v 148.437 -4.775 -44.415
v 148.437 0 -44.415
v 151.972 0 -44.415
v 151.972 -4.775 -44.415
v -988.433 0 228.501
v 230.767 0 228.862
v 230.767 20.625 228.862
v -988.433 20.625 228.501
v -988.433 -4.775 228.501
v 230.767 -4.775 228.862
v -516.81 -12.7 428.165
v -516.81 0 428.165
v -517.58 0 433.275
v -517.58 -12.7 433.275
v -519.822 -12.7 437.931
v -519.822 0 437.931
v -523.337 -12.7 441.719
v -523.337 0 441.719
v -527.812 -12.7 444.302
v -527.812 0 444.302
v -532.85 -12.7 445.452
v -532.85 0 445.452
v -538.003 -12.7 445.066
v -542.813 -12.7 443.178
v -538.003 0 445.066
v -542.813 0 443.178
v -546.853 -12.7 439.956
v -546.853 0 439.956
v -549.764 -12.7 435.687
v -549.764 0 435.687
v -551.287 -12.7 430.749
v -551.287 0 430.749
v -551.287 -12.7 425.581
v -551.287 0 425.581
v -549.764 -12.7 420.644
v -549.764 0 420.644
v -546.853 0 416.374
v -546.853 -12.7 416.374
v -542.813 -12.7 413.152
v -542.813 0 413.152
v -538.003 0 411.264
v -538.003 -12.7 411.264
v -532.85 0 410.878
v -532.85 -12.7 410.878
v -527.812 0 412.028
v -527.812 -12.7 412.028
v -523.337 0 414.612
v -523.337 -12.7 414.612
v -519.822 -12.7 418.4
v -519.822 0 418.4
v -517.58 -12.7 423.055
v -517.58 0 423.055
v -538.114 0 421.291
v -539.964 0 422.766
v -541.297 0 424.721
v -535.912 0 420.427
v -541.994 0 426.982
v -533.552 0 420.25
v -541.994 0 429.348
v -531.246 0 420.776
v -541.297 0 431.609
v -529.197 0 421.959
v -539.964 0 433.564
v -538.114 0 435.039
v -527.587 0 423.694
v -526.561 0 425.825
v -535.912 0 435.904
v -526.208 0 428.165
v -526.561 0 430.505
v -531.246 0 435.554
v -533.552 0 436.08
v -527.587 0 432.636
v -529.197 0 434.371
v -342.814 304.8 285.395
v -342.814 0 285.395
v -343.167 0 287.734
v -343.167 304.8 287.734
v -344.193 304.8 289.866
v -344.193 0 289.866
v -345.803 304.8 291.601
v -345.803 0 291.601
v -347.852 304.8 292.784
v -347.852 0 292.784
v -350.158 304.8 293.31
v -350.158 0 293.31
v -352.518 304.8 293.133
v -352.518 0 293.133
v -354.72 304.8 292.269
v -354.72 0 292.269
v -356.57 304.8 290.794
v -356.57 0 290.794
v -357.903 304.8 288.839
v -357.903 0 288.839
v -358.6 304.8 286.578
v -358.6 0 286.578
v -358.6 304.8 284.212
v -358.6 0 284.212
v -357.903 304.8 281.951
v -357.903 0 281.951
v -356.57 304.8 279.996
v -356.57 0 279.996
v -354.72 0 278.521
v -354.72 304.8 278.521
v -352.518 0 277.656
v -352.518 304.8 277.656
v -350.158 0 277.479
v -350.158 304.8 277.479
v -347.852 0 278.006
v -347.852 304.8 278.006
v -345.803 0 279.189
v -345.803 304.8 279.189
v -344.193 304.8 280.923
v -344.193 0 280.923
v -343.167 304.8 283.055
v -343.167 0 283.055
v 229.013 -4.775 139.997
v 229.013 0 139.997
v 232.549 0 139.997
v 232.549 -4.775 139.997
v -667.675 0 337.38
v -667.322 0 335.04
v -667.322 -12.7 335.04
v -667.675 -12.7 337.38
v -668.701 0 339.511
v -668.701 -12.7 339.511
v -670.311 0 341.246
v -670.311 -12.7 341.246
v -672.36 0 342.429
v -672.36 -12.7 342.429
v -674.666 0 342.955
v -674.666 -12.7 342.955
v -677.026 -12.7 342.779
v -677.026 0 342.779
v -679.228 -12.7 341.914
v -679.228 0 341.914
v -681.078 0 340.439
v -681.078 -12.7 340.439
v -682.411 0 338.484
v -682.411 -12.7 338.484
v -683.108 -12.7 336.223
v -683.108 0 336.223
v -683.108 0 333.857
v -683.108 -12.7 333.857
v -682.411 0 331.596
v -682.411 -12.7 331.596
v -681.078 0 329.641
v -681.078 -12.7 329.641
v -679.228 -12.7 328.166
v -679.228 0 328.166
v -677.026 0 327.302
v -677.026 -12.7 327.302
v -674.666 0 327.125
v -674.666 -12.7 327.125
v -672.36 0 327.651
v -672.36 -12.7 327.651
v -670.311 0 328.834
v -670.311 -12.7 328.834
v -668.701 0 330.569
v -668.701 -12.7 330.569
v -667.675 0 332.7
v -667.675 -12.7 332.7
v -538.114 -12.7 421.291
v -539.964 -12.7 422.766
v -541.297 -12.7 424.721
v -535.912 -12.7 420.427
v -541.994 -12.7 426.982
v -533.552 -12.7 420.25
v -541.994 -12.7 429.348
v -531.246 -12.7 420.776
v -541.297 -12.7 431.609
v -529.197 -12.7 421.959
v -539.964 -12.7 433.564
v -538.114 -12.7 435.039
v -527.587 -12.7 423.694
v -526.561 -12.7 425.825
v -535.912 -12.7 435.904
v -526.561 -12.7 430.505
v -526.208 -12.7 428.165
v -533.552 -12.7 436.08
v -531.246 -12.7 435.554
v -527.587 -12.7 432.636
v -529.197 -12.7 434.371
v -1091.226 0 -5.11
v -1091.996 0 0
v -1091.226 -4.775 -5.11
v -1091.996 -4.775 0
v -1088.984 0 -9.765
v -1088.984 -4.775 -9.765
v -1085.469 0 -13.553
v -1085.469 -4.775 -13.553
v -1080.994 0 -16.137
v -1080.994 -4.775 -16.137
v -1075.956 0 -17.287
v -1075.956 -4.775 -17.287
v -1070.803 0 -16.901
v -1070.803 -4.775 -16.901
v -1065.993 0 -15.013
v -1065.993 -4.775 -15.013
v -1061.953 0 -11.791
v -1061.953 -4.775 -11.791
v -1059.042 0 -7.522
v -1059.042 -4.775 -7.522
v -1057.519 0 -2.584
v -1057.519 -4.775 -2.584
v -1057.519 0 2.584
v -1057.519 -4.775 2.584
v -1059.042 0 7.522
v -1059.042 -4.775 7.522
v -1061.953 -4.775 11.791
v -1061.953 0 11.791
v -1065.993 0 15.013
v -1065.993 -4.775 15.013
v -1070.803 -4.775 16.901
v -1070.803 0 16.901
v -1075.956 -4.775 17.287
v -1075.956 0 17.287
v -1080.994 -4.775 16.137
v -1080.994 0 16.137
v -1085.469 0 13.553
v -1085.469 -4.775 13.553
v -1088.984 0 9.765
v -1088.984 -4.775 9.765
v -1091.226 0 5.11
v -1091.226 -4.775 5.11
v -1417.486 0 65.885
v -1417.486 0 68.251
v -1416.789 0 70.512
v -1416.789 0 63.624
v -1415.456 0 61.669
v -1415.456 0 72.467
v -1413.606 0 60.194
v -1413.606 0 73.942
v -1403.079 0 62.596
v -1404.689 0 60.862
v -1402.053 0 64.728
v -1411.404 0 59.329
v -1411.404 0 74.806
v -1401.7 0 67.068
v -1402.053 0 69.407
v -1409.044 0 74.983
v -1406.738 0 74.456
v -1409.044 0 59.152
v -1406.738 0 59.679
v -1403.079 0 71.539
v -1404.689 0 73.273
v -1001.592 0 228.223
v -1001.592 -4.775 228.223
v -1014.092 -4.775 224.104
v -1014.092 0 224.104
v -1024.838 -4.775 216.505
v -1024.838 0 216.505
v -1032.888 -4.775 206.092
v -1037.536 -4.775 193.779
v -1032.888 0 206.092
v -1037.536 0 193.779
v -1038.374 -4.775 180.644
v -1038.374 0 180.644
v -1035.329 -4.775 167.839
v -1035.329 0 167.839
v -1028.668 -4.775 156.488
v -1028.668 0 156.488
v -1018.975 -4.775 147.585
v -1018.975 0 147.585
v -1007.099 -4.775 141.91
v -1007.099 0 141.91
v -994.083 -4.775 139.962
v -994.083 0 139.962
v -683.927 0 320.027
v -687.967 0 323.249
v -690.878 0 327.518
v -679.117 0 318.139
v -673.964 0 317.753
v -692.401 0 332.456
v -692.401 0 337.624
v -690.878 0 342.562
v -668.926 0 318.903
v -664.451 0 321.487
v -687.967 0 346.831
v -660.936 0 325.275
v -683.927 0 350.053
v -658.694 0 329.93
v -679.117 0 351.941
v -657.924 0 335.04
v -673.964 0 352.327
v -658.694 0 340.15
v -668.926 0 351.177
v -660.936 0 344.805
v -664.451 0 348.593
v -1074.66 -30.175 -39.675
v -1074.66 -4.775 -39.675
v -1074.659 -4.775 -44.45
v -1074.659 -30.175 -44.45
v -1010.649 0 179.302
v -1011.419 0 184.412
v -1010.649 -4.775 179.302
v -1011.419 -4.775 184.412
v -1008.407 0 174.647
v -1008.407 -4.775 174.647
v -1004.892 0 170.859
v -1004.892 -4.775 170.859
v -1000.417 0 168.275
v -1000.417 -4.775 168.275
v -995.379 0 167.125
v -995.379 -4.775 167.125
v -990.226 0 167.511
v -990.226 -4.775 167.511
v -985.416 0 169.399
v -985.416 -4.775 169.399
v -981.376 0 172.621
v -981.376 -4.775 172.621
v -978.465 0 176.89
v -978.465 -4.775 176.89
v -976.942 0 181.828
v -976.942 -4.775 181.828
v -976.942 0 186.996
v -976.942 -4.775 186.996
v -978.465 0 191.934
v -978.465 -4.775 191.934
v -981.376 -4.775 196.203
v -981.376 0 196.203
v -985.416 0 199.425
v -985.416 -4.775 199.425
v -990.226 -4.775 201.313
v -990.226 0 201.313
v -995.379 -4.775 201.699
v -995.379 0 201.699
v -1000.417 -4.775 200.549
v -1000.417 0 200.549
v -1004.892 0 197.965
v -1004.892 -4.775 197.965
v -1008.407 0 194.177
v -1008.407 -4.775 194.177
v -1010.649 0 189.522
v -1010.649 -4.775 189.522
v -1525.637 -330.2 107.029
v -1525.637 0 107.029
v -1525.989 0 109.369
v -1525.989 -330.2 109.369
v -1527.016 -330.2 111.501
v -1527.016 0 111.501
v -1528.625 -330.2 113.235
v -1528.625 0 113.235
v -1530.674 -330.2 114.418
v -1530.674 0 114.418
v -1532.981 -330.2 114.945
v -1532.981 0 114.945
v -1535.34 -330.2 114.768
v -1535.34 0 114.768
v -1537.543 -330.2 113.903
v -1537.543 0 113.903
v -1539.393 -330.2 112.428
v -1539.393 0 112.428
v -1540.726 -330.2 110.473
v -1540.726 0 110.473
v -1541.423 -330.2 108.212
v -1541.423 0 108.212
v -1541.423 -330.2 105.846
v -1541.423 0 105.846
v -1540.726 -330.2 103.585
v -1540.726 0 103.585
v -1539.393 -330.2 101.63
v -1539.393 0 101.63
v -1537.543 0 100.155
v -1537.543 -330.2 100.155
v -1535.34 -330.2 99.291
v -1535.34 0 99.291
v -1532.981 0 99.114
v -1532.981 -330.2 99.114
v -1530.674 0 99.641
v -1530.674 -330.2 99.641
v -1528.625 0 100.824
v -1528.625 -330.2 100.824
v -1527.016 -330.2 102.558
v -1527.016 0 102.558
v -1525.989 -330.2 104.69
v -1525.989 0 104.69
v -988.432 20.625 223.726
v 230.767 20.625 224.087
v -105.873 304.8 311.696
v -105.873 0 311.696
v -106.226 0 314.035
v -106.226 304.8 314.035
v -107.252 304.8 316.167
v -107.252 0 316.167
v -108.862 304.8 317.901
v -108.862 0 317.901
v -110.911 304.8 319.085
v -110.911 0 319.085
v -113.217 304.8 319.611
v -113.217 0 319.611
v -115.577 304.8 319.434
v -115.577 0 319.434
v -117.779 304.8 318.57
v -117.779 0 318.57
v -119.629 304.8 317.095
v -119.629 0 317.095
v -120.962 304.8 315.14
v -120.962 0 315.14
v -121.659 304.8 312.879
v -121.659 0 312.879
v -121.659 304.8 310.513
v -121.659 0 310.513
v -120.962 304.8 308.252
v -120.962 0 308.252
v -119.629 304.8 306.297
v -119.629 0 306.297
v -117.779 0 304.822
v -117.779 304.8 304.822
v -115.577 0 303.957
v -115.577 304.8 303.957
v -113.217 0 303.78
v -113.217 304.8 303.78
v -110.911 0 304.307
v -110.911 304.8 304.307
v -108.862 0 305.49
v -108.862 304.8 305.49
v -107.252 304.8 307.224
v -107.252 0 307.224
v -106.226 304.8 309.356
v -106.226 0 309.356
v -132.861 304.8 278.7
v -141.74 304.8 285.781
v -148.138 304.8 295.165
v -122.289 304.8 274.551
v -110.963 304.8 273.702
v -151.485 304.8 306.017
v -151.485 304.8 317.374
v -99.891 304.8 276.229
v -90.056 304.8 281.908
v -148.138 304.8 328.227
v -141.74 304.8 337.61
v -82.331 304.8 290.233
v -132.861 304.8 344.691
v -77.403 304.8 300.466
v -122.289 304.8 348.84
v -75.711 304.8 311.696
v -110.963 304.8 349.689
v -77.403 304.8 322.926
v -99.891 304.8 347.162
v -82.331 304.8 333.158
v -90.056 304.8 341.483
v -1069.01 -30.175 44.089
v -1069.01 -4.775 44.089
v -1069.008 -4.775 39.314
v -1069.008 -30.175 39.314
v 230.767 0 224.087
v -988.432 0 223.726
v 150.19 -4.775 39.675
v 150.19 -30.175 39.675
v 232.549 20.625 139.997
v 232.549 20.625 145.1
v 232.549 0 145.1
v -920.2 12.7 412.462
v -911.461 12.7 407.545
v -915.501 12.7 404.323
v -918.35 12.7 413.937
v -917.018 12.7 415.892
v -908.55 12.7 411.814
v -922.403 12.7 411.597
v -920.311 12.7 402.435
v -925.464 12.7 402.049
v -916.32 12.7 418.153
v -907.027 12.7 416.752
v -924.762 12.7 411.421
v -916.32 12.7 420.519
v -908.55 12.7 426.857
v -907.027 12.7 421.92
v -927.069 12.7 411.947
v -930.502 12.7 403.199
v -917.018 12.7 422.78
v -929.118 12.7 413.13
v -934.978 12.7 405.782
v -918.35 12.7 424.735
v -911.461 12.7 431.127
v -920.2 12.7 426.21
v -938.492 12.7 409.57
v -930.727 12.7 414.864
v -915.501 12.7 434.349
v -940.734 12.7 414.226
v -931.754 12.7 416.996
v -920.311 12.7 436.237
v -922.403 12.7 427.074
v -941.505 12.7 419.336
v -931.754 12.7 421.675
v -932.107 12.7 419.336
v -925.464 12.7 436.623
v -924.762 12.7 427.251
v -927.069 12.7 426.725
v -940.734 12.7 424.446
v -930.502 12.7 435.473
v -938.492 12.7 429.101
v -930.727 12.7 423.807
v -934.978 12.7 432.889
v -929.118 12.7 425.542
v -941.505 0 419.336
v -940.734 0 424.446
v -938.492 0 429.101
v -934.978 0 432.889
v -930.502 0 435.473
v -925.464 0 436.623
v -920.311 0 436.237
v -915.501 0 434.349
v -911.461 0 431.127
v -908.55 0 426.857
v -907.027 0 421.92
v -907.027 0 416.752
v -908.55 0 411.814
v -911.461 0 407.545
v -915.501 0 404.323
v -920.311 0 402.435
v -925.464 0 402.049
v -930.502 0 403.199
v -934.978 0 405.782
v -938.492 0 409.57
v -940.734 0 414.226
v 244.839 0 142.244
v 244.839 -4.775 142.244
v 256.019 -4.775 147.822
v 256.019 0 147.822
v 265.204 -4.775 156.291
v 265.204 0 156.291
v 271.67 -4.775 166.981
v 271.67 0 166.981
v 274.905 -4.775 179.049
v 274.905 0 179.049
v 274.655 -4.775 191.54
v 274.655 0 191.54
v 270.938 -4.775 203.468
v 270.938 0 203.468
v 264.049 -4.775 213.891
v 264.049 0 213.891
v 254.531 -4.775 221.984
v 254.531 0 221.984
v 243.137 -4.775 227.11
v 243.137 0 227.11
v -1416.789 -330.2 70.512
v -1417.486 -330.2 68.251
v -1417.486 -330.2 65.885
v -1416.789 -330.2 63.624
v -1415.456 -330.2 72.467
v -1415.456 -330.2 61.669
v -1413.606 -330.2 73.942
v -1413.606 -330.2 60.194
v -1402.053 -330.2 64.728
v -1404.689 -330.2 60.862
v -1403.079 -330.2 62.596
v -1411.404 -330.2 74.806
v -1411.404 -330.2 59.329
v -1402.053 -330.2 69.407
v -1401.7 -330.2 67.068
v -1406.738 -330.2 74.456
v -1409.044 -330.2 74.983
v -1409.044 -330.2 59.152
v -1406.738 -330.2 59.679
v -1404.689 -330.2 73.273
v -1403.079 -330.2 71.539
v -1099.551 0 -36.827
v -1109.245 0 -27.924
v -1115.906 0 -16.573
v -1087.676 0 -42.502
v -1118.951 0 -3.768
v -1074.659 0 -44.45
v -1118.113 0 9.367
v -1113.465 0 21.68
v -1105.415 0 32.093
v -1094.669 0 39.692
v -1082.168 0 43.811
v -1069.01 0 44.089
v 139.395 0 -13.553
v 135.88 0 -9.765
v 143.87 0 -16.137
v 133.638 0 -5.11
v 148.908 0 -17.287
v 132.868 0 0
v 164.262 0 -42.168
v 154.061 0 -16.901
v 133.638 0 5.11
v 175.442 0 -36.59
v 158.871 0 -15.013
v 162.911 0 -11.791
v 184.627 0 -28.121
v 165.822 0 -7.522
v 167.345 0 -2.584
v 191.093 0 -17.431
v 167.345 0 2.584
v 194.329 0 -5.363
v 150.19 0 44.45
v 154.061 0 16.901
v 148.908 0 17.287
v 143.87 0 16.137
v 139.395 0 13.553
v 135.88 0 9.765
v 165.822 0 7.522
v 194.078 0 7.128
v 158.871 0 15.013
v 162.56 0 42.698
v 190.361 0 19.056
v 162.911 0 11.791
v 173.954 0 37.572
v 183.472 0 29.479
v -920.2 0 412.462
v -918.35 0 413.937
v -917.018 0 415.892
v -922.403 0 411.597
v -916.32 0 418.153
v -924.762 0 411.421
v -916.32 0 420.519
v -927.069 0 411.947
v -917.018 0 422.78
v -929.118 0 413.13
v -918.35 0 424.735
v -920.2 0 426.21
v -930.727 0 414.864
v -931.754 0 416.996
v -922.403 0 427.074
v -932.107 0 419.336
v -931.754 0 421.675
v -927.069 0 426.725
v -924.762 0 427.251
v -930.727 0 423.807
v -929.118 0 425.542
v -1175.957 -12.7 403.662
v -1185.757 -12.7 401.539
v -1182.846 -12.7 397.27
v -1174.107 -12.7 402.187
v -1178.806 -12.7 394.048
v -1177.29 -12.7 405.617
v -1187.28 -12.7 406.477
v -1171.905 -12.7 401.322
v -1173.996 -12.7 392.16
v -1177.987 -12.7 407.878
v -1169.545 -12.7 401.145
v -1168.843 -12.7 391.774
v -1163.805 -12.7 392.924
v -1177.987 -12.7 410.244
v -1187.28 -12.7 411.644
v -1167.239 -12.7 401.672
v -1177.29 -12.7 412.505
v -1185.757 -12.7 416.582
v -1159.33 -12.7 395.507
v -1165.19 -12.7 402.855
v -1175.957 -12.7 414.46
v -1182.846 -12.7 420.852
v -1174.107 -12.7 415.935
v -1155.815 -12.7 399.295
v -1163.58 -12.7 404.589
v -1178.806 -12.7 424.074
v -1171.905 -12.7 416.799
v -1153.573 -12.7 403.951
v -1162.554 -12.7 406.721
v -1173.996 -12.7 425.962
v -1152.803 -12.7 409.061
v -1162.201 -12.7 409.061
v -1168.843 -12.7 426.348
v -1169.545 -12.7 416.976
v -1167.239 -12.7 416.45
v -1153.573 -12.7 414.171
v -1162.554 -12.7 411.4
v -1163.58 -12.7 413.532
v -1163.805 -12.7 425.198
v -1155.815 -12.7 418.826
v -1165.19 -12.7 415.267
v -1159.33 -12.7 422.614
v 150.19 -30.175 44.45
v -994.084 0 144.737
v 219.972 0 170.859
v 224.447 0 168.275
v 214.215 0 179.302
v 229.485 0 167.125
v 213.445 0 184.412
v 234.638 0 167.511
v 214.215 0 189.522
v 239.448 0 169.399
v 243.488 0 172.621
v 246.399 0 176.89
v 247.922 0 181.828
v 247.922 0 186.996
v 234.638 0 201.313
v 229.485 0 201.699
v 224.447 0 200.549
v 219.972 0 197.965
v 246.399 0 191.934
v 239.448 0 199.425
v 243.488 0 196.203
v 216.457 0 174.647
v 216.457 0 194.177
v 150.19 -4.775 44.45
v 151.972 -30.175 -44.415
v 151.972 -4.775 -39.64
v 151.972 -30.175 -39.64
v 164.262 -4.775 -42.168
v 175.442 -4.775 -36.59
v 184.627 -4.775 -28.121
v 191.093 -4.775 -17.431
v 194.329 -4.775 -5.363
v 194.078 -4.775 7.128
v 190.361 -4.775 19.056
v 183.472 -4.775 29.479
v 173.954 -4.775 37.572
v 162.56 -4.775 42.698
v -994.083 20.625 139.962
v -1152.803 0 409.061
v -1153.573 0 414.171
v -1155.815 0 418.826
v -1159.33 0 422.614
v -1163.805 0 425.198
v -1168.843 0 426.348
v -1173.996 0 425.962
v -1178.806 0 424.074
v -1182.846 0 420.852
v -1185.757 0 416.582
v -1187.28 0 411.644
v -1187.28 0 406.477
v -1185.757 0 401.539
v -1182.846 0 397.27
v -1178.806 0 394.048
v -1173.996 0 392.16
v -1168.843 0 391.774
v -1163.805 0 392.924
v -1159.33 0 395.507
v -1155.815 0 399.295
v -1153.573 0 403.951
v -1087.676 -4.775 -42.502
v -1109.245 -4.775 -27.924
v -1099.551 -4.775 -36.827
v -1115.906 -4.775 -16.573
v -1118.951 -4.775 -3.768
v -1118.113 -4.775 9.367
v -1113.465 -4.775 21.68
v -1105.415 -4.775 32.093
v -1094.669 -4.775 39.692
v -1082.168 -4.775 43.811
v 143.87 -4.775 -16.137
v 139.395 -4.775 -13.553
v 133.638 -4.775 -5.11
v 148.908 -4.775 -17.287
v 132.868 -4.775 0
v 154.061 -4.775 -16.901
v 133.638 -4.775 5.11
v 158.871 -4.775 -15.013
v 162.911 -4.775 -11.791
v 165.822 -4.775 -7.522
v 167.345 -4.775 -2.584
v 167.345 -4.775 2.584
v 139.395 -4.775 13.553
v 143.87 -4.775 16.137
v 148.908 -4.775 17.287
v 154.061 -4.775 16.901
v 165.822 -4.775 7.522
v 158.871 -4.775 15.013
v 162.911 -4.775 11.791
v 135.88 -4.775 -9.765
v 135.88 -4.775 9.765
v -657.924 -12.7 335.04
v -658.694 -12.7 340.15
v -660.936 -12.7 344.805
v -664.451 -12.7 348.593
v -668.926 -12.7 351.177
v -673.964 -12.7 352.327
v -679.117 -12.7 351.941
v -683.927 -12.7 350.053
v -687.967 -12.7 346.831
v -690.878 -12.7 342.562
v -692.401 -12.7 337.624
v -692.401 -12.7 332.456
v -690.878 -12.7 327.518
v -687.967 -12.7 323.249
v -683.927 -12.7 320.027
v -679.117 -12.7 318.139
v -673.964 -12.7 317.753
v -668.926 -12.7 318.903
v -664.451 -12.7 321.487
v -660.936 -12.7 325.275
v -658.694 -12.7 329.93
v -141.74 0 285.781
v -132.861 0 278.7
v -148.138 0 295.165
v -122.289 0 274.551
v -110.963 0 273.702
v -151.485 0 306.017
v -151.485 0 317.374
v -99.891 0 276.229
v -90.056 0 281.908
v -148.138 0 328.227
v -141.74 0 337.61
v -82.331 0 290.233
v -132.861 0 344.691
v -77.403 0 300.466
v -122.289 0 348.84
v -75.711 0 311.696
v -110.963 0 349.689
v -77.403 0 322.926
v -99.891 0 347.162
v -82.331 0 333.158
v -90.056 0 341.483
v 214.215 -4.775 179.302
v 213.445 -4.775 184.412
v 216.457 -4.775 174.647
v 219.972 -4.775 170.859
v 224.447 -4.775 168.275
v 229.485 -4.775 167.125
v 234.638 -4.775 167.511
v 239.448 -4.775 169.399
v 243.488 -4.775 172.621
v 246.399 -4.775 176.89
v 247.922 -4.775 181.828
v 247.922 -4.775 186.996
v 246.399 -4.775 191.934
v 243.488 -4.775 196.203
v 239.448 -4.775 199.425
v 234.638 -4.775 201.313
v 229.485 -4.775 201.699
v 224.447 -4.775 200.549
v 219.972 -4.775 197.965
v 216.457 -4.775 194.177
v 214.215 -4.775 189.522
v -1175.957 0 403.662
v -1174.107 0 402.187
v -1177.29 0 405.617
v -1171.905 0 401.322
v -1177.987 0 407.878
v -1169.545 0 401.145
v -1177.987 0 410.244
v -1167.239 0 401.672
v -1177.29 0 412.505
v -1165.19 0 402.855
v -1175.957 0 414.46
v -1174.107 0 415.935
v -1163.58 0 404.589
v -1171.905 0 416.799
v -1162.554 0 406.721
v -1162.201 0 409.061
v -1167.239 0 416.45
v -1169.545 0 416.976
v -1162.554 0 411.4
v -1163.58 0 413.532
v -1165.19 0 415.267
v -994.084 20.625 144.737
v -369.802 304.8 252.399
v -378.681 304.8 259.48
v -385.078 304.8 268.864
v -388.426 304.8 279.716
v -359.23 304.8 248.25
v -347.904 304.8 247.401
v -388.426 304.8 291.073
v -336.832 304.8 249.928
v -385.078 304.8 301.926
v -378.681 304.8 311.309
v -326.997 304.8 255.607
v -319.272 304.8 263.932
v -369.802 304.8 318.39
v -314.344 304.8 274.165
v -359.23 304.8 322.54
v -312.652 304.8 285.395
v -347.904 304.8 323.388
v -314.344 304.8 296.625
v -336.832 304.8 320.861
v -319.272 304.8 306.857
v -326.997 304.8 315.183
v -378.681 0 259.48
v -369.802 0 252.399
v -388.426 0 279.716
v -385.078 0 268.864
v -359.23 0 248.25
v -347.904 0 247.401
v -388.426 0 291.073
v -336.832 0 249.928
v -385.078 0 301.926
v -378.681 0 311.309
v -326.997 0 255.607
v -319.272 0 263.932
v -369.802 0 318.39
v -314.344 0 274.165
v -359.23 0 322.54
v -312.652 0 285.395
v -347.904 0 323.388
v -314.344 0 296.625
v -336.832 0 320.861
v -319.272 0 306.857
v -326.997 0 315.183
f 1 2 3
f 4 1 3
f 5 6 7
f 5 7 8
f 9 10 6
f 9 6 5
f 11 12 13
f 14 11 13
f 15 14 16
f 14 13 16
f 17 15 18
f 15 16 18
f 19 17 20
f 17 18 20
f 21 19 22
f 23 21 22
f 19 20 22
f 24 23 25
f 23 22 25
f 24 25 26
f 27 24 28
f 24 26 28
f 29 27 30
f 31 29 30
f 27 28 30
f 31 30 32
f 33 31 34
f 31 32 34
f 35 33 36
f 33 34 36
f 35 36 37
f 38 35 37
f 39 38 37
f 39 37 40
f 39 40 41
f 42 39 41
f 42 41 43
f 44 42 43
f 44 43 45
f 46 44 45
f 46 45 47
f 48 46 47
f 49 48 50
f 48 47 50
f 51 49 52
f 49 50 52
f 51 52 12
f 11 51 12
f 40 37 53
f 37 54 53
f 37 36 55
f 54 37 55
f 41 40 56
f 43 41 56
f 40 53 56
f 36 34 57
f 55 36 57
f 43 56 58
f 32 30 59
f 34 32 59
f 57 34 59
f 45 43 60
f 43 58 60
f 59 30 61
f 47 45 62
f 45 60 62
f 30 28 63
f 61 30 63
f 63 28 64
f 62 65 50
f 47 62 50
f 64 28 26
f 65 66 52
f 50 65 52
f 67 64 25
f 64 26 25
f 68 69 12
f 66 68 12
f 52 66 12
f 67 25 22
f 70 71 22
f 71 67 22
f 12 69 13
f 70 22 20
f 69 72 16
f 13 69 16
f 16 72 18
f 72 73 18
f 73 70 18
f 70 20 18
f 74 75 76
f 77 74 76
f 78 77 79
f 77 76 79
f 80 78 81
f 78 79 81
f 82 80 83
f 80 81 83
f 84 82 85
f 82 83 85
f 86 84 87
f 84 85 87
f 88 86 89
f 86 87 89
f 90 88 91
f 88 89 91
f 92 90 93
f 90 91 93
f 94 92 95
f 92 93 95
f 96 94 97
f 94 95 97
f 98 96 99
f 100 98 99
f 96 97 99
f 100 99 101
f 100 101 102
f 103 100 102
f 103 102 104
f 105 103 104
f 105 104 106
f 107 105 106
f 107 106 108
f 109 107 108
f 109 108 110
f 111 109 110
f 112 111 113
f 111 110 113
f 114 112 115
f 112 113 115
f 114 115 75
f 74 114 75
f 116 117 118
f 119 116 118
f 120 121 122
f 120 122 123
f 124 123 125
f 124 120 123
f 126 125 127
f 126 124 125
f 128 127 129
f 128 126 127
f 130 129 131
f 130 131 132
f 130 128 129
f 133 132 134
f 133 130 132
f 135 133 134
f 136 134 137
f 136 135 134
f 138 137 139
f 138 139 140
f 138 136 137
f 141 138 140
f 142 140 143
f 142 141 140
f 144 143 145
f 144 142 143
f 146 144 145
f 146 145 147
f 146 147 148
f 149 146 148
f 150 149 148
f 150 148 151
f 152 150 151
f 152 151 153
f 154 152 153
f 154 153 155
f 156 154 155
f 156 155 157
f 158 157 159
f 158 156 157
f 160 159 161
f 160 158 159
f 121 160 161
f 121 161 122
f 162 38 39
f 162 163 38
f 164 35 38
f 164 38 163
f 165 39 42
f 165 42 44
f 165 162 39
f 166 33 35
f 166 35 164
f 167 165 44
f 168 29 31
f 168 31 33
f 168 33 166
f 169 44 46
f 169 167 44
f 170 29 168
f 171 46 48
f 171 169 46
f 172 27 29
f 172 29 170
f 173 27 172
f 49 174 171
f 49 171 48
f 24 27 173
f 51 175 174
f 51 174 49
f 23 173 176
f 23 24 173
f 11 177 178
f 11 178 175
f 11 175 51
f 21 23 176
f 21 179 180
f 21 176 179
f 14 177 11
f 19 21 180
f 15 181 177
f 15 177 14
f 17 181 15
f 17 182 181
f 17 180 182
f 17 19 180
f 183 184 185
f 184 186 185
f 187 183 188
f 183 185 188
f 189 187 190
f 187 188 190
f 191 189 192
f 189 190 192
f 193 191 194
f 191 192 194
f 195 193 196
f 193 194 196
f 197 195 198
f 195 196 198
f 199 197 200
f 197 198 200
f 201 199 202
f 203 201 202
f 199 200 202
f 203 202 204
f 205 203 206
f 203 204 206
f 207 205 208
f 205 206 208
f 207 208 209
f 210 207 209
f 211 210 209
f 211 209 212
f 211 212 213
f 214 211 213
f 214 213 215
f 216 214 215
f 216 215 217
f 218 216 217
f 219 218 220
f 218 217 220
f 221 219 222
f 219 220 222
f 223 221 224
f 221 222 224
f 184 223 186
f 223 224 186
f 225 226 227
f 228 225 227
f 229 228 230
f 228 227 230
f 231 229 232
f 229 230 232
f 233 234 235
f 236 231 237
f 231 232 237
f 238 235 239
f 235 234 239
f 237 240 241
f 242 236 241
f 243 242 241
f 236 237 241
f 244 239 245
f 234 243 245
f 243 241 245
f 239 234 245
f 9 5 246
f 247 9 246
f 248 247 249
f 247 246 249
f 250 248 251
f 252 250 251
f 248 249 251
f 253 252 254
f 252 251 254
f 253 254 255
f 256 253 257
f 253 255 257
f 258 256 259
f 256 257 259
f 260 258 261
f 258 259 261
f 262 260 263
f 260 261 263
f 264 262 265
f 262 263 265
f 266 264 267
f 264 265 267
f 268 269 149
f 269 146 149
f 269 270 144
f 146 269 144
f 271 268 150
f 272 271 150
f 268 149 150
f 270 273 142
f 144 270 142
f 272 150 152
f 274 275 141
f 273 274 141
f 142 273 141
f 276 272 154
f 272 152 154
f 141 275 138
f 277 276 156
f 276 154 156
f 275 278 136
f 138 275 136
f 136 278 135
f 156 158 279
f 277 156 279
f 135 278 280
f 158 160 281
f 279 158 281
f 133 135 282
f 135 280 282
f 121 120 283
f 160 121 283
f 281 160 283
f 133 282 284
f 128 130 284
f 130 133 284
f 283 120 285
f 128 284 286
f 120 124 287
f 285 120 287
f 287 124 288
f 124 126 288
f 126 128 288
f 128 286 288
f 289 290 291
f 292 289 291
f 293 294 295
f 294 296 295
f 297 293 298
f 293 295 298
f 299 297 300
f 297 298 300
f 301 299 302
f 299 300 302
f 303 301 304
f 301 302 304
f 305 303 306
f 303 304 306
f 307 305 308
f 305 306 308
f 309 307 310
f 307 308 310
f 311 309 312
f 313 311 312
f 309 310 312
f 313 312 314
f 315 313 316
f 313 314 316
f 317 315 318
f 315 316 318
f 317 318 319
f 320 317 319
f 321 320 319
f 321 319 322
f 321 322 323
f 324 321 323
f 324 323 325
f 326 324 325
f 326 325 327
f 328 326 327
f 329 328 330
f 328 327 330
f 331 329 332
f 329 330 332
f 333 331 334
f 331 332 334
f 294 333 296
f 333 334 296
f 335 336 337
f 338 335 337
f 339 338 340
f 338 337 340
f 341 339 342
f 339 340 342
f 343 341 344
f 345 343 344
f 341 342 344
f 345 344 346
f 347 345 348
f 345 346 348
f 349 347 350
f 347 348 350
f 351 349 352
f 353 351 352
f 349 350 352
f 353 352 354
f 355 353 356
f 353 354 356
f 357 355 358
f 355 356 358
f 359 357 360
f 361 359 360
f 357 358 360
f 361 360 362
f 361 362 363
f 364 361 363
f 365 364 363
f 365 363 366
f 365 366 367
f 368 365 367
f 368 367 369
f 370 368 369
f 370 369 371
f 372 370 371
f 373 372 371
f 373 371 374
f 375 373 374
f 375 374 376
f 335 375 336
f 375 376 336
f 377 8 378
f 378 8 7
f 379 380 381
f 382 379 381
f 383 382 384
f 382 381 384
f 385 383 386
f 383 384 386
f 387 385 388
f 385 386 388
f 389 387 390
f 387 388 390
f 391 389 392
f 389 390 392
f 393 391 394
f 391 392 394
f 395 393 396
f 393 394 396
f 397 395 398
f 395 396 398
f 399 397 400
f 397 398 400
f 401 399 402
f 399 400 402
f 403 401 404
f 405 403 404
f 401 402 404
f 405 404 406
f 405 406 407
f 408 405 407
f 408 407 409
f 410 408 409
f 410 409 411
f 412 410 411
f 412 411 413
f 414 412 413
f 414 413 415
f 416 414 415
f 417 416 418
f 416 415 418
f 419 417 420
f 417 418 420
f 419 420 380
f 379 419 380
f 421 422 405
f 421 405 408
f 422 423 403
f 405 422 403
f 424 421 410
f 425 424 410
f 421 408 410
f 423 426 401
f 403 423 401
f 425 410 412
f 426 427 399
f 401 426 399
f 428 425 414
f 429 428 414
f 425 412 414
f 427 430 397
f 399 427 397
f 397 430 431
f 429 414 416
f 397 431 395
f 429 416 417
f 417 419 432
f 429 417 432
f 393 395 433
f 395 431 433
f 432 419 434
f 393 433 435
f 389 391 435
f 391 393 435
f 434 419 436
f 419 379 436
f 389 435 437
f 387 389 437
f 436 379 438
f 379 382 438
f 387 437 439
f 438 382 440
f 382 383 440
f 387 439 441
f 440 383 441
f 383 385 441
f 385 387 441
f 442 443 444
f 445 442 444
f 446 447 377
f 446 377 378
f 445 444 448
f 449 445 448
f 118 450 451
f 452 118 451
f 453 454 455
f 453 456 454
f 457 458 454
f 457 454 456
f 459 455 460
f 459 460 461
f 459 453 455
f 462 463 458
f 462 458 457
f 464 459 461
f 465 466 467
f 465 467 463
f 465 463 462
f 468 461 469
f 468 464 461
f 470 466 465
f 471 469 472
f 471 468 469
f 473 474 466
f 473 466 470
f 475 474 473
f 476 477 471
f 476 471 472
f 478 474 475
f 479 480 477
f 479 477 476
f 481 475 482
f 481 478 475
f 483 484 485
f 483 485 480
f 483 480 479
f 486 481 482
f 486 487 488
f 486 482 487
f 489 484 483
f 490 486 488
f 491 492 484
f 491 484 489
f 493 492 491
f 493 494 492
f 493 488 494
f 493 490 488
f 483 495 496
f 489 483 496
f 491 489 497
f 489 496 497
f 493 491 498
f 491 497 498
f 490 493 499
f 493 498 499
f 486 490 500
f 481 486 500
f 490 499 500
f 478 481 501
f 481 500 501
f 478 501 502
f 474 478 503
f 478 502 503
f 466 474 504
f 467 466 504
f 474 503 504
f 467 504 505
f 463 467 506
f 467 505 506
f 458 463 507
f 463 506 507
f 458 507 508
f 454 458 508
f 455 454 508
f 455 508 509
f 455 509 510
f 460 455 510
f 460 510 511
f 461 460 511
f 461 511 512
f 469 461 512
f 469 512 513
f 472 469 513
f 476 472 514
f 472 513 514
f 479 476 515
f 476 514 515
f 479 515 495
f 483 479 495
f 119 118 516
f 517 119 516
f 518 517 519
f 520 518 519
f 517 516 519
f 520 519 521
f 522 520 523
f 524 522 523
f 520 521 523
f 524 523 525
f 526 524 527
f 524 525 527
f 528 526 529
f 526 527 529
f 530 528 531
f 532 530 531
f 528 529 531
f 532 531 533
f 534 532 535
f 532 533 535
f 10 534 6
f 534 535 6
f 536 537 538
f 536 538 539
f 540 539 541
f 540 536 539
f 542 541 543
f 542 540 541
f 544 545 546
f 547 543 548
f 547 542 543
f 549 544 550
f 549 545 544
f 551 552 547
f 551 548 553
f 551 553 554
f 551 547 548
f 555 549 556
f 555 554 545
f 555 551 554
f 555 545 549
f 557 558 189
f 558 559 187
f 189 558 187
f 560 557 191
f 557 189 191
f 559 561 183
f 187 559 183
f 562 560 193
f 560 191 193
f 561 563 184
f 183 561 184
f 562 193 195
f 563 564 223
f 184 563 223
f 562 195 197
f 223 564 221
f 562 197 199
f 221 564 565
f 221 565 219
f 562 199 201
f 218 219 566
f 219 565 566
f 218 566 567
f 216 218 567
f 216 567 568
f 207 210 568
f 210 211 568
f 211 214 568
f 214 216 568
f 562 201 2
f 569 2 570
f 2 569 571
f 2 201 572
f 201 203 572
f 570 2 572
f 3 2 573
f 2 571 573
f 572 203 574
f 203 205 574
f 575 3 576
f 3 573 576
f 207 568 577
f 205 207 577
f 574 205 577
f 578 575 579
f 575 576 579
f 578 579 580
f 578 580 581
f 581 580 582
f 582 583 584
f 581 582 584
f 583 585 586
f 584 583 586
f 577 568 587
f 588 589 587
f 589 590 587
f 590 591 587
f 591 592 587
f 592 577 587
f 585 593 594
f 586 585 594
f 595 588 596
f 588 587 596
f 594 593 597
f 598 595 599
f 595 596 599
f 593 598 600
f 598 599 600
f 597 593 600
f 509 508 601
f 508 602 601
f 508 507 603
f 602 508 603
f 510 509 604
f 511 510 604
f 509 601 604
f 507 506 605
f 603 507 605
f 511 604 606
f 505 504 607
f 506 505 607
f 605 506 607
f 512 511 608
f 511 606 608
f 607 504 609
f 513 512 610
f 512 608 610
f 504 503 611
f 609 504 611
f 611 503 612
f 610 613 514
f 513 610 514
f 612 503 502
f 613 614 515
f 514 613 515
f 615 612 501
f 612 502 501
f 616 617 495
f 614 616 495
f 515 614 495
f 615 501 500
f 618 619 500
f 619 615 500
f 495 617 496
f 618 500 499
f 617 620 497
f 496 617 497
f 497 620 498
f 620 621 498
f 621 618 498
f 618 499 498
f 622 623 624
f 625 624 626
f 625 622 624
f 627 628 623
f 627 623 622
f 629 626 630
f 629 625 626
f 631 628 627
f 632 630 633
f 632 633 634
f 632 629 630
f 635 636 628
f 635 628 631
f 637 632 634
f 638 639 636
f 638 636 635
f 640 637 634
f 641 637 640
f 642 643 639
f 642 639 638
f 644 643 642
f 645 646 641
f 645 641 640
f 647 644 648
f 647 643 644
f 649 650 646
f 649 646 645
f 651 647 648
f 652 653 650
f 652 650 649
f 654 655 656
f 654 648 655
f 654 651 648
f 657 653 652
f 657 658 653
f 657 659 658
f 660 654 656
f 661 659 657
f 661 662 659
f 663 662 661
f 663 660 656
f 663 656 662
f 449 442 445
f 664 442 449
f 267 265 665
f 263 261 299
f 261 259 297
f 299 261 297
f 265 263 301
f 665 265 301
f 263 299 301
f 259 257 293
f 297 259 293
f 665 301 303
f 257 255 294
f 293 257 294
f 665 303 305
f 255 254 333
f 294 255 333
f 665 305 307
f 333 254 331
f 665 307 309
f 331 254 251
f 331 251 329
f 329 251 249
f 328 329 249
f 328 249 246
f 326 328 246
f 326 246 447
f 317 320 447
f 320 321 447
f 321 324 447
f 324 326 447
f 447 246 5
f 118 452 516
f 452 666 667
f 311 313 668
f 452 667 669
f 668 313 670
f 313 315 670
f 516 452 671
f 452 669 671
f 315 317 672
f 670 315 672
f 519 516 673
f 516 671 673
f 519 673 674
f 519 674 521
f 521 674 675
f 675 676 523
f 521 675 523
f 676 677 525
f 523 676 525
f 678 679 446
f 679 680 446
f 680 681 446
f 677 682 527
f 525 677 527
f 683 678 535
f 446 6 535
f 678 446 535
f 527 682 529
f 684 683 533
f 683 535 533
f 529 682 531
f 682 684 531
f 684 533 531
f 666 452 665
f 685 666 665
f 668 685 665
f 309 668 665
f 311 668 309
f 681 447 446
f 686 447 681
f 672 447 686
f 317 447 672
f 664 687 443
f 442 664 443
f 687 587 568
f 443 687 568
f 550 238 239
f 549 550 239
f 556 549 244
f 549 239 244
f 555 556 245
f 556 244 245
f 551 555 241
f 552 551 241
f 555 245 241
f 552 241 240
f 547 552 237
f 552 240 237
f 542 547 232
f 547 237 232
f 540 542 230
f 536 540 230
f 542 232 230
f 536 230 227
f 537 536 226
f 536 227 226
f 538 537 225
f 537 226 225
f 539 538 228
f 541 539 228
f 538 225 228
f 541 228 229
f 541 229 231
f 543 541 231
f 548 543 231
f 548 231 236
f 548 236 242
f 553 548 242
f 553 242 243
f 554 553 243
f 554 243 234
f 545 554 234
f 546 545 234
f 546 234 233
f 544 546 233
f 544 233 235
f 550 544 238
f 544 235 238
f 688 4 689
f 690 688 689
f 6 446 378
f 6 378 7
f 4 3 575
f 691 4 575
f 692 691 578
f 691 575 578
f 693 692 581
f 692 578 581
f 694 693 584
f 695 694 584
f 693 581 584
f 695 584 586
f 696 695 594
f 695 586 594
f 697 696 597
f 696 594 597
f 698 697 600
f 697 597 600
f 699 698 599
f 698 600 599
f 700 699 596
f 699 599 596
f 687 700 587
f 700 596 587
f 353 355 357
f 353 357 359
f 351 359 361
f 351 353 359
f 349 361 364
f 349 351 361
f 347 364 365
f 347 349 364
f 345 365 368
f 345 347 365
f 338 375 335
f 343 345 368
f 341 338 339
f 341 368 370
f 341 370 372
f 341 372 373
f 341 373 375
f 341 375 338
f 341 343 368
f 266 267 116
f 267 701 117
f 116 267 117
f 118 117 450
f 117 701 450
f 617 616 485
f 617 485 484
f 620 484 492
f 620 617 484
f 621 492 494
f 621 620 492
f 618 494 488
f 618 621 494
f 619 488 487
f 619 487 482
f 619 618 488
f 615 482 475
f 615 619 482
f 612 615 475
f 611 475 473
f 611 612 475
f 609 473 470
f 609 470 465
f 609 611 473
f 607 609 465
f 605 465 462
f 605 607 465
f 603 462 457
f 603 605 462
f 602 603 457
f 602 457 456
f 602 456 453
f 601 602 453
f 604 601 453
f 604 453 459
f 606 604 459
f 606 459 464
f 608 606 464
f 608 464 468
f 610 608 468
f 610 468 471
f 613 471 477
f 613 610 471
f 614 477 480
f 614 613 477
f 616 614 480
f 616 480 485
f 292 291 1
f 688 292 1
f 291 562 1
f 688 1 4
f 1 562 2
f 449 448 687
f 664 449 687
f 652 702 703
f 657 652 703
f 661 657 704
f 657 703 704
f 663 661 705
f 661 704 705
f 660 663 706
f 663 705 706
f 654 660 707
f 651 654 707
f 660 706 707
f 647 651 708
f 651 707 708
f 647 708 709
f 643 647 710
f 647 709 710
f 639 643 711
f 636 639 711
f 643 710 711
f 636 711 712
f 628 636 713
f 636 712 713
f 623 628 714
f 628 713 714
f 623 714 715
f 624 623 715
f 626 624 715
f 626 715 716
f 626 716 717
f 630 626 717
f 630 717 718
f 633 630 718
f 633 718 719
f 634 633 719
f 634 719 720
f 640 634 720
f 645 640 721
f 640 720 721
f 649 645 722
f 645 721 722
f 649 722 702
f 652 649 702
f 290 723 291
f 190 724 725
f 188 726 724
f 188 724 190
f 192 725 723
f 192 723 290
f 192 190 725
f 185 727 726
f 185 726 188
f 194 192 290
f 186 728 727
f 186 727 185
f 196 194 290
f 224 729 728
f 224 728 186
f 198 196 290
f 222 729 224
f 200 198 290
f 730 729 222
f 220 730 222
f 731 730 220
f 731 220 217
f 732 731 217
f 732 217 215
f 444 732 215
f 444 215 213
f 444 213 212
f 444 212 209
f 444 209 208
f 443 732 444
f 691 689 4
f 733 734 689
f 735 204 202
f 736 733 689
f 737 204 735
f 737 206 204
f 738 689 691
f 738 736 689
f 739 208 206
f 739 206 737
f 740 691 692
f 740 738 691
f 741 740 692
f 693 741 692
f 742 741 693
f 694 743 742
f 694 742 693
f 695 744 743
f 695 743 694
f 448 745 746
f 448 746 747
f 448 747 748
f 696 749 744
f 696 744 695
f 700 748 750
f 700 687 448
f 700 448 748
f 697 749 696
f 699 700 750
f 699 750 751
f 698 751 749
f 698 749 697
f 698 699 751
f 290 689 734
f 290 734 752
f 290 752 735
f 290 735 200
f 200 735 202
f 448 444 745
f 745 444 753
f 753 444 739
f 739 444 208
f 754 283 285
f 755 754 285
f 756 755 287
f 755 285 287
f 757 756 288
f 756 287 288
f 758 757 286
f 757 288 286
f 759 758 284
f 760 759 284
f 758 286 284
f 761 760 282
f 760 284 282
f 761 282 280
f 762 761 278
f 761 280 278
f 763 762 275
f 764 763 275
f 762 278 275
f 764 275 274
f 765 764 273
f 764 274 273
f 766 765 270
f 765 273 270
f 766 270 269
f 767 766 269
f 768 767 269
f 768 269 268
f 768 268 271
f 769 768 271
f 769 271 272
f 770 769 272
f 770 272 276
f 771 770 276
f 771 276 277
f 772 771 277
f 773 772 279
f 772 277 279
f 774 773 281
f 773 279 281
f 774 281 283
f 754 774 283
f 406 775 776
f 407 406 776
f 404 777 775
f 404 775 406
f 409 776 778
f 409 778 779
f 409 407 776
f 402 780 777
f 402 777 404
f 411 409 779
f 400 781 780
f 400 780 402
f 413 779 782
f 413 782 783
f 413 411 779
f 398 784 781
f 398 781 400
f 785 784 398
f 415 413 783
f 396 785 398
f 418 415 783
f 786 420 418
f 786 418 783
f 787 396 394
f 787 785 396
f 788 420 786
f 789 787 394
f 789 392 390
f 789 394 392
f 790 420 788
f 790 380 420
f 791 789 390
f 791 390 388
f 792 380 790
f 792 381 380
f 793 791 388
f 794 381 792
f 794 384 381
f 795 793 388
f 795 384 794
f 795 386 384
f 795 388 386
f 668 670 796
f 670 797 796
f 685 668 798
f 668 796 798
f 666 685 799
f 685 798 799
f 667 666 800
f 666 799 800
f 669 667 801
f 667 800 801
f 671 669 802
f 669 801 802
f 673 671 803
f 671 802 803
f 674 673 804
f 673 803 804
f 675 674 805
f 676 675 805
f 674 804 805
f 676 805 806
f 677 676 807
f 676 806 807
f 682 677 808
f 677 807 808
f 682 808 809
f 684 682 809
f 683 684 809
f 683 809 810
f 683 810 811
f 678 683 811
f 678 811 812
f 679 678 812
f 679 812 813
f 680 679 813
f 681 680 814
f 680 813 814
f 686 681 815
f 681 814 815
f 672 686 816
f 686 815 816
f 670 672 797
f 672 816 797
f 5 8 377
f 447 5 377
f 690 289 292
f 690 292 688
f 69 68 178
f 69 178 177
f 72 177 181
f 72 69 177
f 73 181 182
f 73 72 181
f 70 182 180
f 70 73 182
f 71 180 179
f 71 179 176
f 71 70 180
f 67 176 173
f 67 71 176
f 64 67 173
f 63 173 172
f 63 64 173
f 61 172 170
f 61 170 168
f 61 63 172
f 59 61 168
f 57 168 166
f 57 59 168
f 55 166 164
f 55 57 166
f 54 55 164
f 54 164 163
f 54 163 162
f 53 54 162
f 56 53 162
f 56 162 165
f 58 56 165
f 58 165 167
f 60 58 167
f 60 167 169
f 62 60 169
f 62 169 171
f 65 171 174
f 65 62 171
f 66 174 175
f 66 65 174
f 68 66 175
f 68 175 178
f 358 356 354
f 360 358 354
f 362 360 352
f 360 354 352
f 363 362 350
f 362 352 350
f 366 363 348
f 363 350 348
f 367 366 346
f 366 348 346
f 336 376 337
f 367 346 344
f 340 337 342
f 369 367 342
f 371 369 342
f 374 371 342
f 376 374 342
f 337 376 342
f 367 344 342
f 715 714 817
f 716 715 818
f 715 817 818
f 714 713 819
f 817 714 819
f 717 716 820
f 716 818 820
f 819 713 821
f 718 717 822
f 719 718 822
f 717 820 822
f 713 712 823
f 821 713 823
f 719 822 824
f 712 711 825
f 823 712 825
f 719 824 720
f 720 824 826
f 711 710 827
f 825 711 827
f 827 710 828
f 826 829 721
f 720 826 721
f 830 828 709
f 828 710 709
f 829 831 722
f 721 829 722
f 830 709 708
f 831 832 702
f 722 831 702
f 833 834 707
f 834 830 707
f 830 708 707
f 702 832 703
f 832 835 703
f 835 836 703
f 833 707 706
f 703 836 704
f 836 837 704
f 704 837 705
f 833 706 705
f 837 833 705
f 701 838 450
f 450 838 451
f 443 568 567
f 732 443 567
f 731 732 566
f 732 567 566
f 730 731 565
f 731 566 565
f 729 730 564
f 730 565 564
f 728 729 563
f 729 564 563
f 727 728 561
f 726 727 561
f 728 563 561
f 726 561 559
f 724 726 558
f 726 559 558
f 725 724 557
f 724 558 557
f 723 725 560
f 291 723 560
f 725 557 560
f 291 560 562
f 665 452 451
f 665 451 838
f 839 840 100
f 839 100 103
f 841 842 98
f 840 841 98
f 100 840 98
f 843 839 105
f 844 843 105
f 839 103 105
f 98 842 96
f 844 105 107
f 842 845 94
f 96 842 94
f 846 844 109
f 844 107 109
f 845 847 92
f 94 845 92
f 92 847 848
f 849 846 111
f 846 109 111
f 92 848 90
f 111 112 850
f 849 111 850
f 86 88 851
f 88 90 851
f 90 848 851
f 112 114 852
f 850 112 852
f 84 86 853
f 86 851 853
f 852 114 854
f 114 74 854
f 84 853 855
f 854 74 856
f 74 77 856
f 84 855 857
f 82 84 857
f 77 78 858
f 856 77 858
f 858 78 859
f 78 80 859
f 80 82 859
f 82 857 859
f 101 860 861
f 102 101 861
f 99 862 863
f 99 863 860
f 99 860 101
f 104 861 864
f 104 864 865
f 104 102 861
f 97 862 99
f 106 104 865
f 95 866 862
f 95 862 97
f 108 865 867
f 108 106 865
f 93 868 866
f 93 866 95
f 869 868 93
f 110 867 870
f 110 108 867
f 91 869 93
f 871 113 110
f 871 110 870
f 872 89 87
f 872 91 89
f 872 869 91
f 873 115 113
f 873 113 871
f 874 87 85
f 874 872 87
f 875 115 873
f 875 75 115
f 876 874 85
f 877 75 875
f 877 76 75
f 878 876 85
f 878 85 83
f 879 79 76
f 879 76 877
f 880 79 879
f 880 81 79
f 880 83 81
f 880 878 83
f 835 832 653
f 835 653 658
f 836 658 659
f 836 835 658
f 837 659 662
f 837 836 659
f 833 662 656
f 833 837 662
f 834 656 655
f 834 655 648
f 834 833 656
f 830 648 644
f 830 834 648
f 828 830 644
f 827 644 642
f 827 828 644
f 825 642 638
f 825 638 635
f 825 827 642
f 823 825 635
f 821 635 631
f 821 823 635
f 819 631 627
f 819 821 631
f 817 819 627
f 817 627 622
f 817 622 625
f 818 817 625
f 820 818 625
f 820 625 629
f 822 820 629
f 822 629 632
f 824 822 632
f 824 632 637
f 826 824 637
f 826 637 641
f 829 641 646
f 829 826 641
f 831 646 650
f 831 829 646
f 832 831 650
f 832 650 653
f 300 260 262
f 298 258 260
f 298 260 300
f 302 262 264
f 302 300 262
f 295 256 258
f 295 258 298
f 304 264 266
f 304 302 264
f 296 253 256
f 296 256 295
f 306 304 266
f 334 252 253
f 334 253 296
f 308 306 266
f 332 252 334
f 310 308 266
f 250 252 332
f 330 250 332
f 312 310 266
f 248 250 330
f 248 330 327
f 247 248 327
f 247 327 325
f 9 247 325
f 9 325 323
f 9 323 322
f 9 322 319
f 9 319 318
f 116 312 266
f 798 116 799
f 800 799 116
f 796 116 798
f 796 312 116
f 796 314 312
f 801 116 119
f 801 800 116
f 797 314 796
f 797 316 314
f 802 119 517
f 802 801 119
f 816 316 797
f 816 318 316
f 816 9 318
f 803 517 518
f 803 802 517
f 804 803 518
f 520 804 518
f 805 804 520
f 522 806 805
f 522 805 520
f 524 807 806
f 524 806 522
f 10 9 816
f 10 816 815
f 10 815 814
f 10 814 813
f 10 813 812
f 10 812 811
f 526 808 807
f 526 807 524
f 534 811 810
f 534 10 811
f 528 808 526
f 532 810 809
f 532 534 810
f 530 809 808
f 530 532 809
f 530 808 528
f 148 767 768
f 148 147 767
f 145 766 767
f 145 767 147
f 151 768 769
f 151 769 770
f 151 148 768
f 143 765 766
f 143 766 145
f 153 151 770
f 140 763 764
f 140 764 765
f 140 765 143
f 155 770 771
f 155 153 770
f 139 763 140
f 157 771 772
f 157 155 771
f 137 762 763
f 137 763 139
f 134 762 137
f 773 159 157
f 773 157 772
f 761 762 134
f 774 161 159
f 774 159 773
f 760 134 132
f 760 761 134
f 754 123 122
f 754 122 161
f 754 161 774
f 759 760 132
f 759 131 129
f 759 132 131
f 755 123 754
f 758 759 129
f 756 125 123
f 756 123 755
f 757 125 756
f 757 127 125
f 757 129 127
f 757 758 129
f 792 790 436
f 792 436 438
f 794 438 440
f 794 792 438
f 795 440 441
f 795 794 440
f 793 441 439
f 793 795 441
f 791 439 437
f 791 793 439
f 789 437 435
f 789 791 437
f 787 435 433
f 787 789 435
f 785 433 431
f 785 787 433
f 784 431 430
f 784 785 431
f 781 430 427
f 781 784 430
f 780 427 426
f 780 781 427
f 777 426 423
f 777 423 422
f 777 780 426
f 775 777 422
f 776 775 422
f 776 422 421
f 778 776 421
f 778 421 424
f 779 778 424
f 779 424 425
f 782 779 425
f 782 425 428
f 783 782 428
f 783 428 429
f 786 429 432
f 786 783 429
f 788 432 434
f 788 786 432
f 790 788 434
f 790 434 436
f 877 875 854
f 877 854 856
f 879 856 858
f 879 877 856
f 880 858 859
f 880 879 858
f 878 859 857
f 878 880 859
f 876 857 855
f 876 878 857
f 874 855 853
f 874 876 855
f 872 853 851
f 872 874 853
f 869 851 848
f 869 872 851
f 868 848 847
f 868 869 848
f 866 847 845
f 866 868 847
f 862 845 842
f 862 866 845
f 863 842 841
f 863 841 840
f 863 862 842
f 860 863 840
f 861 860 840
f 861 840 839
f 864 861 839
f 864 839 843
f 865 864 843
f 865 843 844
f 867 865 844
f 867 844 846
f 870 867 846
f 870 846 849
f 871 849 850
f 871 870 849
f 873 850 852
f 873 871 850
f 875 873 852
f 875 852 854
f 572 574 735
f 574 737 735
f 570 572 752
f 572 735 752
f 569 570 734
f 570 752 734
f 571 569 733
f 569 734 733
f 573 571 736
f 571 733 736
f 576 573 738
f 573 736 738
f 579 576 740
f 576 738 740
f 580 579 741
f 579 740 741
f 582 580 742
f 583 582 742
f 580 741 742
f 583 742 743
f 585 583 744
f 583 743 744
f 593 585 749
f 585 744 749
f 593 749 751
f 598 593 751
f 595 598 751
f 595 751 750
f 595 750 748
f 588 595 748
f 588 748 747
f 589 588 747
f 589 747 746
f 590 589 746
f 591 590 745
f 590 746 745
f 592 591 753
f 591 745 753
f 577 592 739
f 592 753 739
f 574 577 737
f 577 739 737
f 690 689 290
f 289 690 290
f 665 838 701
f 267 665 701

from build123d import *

# Parameters (mm, degrees)
F1_DEPTH  = 4.7752
F2_D      = 34.671
F2_DEPTH  = 4.7752
F2_TIP    = 10.4162192612
F4_DEPTH  = 25.4
F6_DEPTH  = 4.7752
F7_D      = 34.671
F7_DEPTH  = 4.7752
F7_TIP    = 10.4162192612
F9_DEPTH  = 25.4
F10_R     = 17.3355
F10_R_2   = 7.9375
F11_DEPTH = 12.7
F12_R     = 17.3355
F12_R_2   = 7.9375
F13_DEPTH = 12.7
F14_R     = 17.3355
F14_R_2   = 7.9375
F15_DEPTH = 12.7
F16_R     = 17.3355
F16_R_2   = 7.9375
F17_DEPTH = 12.7
F18_R     = 38.1
F18_R_2   = 7.9375
F19_DEPTH = 304.8
F20_R     = 38.1
F20_R_2   = 7.9375
F21_DEPTH = 304.8
F22_R     = 7.9375
F23_DEPTH = 330.2
F24_R     = 7.9375
F25_DEPTH = 330.2


# Not quite as in the source:
# - a feature names something its author has since deleted; it is built from what else it names


with BuildPart() as f1:
    # F0 (on Front) → F1 (new body)
    with BuildSketch(Plane.XZ):
        with BuildLine():
            Line((-1074.6594506346, -44.4499999817), (148.4365754055, -44.414878516))
            Line((148.4365754055, -44.414878516), (151.9724341991, -44.414776983))
            ThreePointArc((151.9724341991, -44.414776983), (194.6442914443, 0.8913507924), (150.1900805819, 44.4499980552))
            Line((150.1900805819, 44.4499980552), (-1069.0098660753, 44.0893441833))
            ThreePointArc((-1069.0098660753, 44.0893441833), (-1119.0205120843, 2.8305422757), (-1074.6594506346, -44.4499999817))
        make_face()
    extrude(amount=F1_DEPTH)

    # F2
    with Locations(Plane(origin=(0, 0, 0), x_dir=(1, 0, 0), z_dir=(0, 1, 0))):
        with Locations((-1074.6607270259, 0), (150.2032294209, 0)):
            Hole(F2_D / 2, depth=F2_DEPTH)
            with Locations((0, 0, -(F2_DEPTH + F2_TIP / 2))):  # 118° drill point
                Cone(0, F2_D / 2, F2_TIP, mode=Mode.SUBTRACT)

    # F3 (on face) → F4 (join)
    with BuildSketch(Plane.XZ.offset(4.7752)):
        Polygon((-1074.6595877555, -39.6747999836), (-1074.6594506346, -44.4499999817), (151.9724341991, -44.414776983), (151.9722970782, -39.639576985), align=None)
        Polygon((150.1900805819, 44.4499980552), (-1069.0098660753, 44.0893441833), (-1069.0084535143, 39.3141446012), (150.1900805819, 39.6747980552), align=None)
    extrude(amount=F4_DEPTH)


with BuildPart() as f6:
    # F5 (on Front) → F6 (new body)
    with BuildSketch(Plane.XZ):
        with BuildLine():
            Line((-994.0826163973, 139.9620227242), (229.0134096428, 139.9971441899))
            Line((229.0134096428, 139.9971441899), (232.5492684364, 139.9972457228))
            ThreePointArc((232.5492684364, 139.9972457228), (275.2211256816, 185.3033734983), (230.7669148192, 228.8620207611))
            Line((230.7669148192, 228.8620207611), (-988.433031838, 228.5013668892))
            ThreePointArc((-988.433031838, 228.5013668892), (-1038.443677847, 187.2425649815), (-994.0826163973, 139.9620227242))
        make_face()
    extrude(amount=F6_DEPTH)

    # F7
    with Locations(Plane(origin=(0, 0, 0), x_dir=(1, 0, 0), z_dir=(0, 1, 0))):
        with Locations((-994.0838927886, -184.4120227059), (230.7800636583, -184.4120227059)):
            Hole(F7_D / 2, depth=F7_DEPTH)
            with Locations((0, 0, -(F7_DEPTH + F7_TIP / 2))):  # 118° drill point
                Cone(0, F7_D / 2, F7_TIP, mode=Mode.SUBTRACT)

    # F8 (on face) → F9 (join)
    with BuildSketch(Plane.XZ.offset(4.7752)):
        Polygon((230.7669148192, 228.8620207611), (-988.433031838, 228.5013668892), (-988.431619277, 223.7261670981), (230.7669148192, 224.0868205521), align=None)
        Polygon((-994.0840289583, 144.7372225153), (-994.0826163973, 139.9620227242), (232.5492684364, 139.9972457228), (232.5492684364, 145.1000752608), align=None)
    extrude(amount=-F9_DEPTH)


with BuildPart() as f11:
    # F10 (on Front) → F11 (new body)
    with BuildSketch(Plane.XZ):
        with Locations((-675.2595901489, 335.0400328636)):
            Circle(F10_R)
        with Locations((-675.2595901489, 335.0400328636)):
            Circle(F10_R_2, mode=Mode.SUBTRACT)
    extrude(amount=F11_DEPTH)


with BuildPart() as f13:
    # F12 (on face) → F13 (new body)
    with BuildSketch(Plane(origin=(0, 0, 0), x_dir=(-1, 0, 0), z_dir=(0, 1, 0))):
        with Locations((924.1690039635, 419.3358123302)):
            Circle(F12_R)
        with Locations((924.1690039635, 419.3358123302)):
            Circle(F12_R_2, mode=Mode.SUBTRACT)
    extrude(amount=F13_DEPTH)


with BuildPart() as f15:
    # F14 (on Front) → F15 (new body)
    with BuildSketch(Plane.XZ):
        with Locations((-534.1455936432, 428.1651079655)):
            Circle(F14_R)
        with Locations((-534.1455936432, 428.1651079655)):
            Circle(F14_R_2, mode=Mode.SUBTRACT)
    extrude(amount=F15_DEPTH)


with BuildPart() as f17:
    # F16 (on Front) → F17 (new body)
    with BuildSketch(Plane.XZ):
        with Locations((-1170.1385974884, 409.0607762337)):
            Circle(F16_R)
        with Locations((-1170.1385974884, 409.0607762337)):
            Circle(F16_R_2, mode=Mode.SUBTRACT)
    extrude(amount=F17_DEPTH)


with BuildPart() as f19:
    # F18 (on Front) → F19 (new body)
    with BuildSketch(Plane.XZ):
        with Locations((-350.7515192032, 285.3947877884)):
            Circle(F18_R)
        with Locations((-350.7515192032, 285.3947877884)):
            Circle(F18_R_2, mode=Mode.SUBTRACT)
    extrude(amount=-F19_DEPTH)


with BuildPart() as f21:
    # F20 (on Front) → F21 (new body)
    with BuildSketch(Plane.XZ):
        with Locations((-113.8105988503, 311.6956949234)):
            Circle(F20_R)
        with Locations((-113.8105988503, 311.6956949234)):
            Circle(F20_R_2, mode=Mode.SUBTRACT)
    extrude(amount=-F21_DEPTH)


with BuildPart() as f23:
    # F22 (on Front) → F23 (new body)
    with BuildSketch(Plane.XZ):
        with Locations((-1409.6375703812, 67.0676827431)):
            Circle(F22_R)
    extrude(amount=F23_DEPTH)


with BuildPart() as f25:
    # F24 (on Front) → F25 (new body)
    with BuildSketch(Plane.XZ):
        with Locations((-1533.5742235184, 107.0293113589)):
            Circle(F24_R)
    extrude(amount=F25_DEPTH)


solid = Compound([f1.part, f6.part, f11.part, f13.part, f15.part, f17.part, f19.part, f21.part, f23.part, f25.part])
